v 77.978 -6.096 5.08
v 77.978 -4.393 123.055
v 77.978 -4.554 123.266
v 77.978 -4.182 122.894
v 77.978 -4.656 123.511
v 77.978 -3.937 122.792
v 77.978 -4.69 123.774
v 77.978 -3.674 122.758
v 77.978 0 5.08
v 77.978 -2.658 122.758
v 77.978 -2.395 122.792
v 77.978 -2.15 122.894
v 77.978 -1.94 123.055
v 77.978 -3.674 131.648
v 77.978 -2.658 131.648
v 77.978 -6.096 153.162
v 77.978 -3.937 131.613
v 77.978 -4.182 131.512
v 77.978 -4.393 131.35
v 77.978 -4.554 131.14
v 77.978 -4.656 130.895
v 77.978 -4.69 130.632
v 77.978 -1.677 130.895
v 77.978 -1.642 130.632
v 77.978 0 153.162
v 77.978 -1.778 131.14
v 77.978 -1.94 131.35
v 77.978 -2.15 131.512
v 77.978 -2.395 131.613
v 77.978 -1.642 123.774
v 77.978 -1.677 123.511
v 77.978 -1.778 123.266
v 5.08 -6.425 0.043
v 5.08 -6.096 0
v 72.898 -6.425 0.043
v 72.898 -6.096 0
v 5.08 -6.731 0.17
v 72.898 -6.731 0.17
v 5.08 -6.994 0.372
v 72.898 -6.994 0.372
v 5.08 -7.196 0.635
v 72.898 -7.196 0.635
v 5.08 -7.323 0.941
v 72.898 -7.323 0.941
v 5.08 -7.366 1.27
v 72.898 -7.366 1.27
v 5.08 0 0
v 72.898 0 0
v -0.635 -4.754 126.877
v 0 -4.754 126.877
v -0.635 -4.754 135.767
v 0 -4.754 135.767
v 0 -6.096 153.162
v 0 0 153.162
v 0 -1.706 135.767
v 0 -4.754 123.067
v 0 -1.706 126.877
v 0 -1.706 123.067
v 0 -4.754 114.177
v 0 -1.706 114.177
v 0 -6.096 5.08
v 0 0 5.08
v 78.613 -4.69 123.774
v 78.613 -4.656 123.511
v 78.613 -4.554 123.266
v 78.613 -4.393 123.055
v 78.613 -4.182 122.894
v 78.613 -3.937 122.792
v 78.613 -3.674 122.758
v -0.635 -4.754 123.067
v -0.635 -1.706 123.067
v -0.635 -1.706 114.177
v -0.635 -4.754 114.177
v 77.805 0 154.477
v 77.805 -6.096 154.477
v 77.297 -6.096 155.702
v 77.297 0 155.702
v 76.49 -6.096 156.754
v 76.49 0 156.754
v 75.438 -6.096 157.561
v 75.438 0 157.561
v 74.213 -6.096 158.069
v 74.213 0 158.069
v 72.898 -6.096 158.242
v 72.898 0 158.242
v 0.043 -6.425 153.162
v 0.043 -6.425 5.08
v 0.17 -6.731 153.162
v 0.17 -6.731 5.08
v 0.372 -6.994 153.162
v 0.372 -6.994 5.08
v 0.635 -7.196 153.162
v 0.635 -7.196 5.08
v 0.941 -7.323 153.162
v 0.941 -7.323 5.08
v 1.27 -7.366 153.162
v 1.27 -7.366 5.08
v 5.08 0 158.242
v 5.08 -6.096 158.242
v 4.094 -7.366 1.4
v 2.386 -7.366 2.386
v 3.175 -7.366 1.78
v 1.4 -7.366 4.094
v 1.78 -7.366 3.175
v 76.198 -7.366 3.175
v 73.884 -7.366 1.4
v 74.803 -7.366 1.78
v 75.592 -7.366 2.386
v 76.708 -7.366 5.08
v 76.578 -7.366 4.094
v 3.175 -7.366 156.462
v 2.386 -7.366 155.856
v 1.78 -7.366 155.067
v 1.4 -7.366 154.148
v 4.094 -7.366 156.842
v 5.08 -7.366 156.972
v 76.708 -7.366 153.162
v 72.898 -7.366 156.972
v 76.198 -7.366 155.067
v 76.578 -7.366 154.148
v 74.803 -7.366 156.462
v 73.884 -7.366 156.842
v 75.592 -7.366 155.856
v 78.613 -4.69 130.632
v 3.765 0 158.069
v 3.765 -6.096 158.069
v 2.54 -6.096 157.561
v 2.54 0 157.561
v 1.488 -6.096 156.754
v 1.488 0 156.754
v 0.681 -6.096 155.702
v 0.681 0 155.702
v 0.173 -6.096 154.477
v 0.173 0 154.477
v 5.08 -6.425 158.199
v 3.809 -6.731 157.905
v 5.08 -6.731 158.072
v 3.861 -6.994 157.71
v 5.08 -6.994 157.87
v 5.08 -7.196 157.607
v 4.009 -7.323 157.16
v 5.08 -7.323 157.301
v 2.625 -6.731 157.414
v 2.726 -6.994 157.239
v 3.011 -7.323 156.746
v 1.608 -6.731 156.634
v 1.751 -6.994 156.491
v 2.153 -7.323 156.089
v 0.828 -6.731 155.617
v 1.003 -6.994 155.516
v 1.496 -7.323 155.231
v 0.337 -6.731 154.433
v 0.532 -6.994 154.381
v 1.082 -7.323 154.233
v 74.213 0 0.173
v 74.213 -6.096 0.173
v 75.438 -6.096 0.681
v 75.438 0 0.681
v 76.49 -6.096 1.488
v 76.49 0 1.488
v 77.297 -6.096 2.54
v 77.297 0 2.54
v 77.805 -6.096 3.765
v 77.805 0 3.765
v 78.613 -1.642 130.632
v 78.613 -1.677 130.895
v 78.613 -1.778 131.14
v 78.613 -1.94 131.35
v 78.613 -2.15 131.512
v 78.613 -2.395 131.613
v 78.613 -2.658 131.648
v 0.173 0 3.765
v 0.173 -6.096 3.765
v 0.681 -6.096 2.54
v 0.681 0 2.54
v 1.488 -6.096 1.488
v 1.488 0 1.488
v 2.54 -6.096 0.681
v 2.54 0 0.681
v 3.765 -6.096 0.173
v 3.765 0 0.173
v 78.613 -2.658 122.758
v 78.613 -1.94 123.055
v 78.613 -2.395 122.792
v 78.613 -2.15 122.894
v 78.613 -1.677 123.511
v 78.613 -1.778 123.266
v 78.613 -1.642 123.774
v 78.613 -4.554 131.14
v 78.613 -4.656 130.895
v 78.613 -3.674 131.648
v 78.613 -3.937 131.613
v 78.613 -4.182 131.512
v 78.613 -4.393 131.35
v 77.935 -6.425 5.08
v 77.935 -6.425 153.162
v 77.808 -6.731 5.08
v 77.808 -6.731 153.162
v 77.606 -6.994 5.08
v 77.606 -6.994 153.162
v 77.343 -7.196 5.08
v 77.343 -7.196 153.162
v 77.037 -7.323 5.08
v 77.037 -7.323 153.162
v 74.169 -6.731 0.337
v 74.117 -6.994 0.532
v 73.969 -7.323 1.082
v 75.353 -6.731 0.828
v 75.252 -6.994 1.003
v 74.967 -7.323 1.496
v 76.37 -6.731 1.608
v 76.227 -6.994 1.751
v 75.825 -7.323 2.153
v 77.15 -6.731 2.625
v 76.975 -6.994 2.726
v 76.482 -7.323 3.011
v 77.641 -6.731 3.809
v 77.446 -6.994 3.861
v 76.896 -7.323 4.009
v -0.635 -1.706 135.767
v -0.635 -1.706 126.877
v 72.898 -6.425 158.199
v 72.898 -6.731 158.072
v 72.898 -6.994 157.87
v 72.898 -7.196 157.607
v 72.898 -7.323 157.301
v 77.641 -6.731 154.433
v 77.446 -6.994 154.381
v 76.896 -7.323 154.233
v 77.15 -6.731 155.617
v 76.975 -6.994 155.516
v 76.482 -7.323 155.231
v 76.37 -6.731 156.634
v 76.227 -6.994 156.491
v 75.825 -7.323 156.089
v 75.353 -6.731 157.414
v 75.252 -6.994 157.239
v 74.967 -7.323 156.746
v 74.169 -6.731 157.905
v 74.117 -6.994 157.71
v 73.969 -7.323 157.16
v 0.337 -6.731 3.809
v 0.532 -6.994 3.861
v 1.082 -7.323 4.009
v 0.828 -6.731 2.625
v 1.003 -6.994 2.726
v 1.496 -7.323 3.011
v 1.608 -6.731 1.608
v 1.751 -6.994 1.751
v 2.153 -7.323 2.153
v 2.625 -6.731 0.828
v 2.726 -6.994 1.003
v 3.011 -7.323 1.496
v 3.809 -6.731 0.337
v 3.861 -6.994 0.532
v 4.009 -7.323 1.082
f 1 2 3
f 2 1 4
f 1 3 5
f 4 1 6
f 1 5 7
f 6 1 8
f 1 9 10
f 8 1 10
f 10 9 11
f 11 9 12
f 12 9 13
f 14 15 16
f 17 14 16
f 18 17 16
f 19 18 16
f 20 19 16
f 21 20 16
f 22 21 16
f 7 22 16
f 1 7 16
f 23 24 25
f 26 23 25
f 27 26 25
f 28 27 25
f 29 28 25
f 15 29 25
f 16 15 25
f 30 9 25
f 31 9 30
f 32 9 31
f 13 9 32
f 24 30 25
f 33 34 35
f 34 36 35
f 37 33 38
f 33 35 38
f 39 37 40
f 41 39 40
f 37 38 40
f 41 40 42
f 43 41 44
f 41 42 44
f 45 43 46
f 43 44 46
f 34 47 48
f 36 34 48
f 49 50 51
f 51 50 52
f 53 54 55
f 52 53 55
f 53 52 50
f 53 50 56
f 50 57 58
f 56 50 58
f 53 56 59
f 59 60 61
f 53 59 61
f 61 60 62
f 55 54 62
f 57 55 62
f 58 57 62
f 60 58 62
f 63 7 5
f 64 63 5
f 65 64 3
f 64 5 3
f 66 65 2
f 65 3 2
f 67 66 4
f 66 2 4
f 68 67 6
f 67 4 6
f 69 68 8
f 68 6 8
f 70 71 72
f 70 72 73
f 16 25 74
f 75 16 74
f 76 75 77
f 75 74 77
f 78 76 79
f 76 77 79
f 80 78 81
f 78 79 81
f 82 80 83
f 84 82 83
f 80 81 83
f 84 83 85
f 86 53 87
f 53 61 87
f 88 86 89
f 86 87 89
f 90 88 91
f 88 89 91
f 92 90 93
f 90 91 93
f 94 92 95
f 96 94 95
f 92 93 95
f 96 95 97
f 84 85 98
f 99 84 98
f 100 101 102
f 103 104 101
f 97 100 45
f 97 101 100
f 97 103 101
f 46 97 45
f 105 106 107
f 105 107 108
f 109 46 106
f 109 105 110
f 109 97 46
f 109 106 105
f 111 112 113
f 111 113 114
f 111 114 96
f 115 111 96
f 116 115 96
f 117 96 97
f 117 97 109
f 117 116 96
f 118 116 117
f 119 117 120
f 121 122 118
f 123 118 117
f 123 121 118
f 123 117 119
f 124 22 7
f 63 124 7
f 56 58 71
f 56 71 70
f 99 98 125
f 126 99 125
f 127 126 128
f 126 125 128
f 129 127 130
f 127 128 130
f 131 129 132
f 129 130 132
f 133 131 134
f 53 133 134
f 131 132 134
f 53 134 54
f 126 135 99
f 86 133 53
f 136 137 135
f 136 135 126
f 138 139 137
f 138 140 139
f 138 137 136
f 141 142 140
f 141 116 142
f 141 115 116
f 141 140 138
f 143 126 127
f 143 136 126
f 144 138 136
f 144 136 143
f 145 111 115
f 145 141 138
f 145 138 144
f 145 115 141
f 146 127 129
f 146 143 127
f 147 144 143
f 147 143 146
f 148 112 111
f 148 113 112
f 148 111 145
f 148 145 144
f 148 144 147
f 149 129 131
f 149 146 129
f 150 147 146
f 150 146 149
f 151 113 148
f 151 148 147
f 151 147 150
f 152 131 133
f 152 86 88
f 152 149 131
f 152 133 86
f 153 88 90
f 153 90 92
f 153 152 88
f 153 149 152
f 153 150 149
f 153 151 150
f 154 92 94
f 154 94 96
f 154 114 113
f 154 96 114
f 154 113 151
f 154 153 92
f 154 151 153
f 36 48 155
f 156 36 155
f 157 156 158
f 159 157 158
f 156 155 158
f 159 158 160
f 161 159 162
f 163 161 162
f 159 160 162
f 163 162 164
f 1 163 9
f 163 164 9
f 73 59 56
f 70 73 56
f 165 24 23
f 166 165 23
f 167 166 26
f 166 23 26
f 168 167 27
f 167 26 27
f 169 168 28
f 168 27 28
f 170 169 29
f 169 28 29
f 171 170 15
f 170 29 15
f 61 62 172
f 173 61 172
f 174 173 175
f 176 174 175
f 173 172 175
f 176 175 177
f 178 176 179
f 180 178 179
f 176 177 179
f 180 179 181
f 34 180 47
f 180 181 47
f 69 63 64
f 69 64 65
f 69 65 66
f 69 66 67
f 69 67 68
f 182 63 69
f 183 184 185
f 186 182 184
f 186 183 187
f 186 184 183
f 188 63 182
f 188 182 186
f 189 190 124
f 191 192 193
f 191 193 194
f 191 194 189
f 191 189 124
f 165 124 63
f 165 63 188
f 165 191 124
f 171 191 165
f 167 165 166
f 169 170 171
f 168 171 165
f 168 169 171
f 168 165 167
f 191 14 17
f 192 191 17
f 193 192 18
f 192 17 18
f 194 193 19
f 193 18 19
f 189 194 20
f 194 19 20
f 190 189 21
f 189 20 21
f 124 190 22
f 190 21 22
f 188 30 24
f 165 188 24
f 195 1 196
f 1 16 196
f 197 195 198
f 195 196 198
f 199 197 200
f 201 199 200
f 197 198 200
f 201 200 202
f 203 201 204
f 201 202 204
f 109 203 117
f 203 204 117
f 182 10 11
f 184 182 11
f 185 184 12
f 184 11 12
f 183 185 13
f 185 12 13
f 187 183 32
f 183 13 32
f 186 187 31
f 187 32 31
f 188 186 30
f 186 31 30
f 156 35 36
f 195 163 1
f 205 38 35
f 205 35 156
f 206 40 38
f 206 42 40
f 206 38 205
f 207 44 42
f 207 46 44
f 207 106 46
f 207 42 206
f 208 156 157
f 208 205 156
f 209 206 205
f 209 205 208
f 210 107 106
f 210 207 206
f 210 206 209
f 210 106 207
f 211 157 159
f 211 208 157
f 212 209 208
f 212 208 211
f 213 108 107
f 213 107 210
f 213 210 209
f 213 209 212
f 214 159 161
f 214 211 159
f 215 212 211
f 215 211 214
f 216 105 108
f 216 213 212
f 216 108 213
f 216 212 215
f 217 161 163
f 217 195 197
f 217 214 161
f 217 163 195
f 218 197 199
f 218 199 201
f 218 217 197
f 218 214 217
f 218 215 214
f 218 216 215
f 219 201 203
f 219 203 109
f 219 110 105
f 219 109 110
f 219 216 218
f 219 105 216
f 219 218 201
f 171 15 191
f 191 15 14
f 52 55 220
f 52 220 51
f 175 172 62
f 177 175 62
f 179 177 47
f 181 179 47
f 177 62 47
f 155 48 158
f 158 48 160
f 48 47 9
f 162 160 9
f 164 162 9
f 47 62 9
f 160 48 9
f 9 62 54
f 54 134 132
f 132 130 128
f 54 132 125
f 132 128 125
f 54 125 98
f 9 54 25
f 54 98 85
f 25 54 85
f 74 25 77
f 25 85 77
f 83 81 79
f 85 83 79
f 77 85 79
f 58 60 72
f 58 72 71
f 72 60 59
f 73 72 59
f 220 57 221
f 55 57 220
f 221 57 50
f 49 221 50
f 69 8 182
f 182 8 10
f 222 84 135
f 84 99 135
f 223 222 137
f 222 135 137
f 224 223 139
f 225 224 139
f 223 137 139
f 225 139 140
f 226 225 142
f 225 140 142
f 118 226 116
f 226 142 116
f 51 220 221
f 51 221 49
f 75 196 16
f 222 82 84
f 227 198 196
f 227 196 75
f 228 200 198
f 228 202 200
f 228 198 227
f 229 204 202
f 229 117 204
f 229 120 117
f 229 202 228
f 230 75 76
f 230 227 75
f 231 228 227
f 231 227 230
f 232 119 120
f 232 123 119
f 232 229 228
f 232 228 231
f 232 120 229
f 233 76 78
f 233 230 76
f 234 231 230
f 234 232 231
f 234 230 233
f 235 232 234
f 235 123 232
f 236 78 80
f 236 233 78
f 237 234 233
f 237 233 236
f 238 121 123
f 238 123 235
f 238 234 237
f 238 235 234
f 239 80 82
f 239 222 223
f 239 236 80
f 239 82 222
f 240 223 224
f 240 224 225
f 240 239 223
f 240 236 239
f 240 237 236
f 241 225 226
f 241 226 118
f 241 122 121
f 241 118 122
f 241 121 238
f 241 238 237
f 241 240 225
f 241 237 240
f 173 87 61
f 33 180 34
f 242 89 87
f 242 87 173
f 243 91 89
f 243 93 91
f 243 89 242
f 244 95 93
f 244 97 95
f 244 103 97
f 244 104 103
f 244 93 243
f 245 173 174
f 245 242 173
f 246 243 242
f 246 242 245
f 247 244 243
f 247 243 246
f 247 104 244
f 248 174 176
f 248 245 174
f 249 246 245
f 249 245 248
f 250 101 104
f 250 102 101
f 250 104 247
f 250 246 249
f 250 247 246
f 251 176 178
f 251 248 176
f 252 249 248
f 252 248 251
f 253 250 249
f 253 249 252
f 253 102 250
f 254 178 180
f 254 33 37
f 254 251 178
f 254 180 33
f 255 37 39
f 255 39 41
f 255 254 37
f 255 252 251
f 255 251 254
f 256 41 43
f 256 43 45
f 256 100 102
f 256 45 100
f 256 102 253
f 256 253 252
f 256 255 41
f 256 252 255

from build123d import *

# Parameters (mm, degrees)
F1_DEPTH = 7.366
F2_R     = 1.27
F4_DEPTH = 0.635
F5_W     = 3.048
F5_H     = 8.89
F6_DEPTH = 0.635


with BuildPart() as f1:
    # F0 (on Front) → F1 (new body)
    with BuildSketch(Plane.XZ):
        with BuildLine():
            Line((0, 153.162), (0, 5.08))
            ThreePointArc((0, 5.08), (1.487898, 1.487898), (5.08, 0))
            Line((5.08, 0), (72.898, 0))
            ThreePointArc((72.898, 0), (76.490102, 1.487898), (77.978, 5.08))
            Line((77.978, 5.08), (77.978, 153.162))
            ThreePointArc((77.978, 153.162), (76.490102, 156.754102), (72.898, 158.242))
            Line((72.898, 158.242), (5.08, 158.242))
            ThreePointArc((5.08, 158.242), (1.487898, 156.754102), (0, 153.162))
        make_face()
    extrude(amount=F1_DEPTH)

    # F2
    f2_edges = [f1.edges().sort_by_distance(p)[0] for p in [
        (38.989, -7.366, 0),
    ]]
    fillet(f2_edges, radius=F2_R)

    # F3 (on face) → F4 (join)
    with BuildSketch(Plane.YZ.offset(77.978)):
        with BuildLine():
            Line((-2.658174, 131.647782), (-3.674174, 131.647782))
            ThreePointArc((-3.674174, 131.647782), (-4.392594, 131.350203), (-4.690174, 130.631782))
            Line((-4.690174, 130.631782), (-4.690174, 123.773782))
            ThreePointArc((-4.690174, 123.773782), (-4.392594, 123.055362), (-3.674174, 122.757782))
            Line((-3.674174, 122.757782), (-2.658174, 122.757782))
            ThreePointArc((-2.658174, 122.757782), (-1.939753, 123.055362), (-1.642174, 123.773782))
            Line((-1.642174, 123.773782), (-1.642174, 130.631782))
            ThreePointArc((-1.642174, 130.631782), (-1.939753, 131.350203), (-2.658174, 131.647782))
        make_face()
    extrude(amount=F4_DEPTH)

    # F5 (on face) → F6 (join)
    with BuildSketch(Plane(origin=(0, 0, 0), x_dir=(0, -1, 0), z_dir=(-1, 0, 0))):
        with Locations((3.230303, 131.321728)):
            Rectangle(F5_W, F5_H)
        with Locations((3.230303, 118.621728)):
            Rectangle(F5_W, F5_H)
    extrude(amount=F6_DEPTH)


solid = f1.part
